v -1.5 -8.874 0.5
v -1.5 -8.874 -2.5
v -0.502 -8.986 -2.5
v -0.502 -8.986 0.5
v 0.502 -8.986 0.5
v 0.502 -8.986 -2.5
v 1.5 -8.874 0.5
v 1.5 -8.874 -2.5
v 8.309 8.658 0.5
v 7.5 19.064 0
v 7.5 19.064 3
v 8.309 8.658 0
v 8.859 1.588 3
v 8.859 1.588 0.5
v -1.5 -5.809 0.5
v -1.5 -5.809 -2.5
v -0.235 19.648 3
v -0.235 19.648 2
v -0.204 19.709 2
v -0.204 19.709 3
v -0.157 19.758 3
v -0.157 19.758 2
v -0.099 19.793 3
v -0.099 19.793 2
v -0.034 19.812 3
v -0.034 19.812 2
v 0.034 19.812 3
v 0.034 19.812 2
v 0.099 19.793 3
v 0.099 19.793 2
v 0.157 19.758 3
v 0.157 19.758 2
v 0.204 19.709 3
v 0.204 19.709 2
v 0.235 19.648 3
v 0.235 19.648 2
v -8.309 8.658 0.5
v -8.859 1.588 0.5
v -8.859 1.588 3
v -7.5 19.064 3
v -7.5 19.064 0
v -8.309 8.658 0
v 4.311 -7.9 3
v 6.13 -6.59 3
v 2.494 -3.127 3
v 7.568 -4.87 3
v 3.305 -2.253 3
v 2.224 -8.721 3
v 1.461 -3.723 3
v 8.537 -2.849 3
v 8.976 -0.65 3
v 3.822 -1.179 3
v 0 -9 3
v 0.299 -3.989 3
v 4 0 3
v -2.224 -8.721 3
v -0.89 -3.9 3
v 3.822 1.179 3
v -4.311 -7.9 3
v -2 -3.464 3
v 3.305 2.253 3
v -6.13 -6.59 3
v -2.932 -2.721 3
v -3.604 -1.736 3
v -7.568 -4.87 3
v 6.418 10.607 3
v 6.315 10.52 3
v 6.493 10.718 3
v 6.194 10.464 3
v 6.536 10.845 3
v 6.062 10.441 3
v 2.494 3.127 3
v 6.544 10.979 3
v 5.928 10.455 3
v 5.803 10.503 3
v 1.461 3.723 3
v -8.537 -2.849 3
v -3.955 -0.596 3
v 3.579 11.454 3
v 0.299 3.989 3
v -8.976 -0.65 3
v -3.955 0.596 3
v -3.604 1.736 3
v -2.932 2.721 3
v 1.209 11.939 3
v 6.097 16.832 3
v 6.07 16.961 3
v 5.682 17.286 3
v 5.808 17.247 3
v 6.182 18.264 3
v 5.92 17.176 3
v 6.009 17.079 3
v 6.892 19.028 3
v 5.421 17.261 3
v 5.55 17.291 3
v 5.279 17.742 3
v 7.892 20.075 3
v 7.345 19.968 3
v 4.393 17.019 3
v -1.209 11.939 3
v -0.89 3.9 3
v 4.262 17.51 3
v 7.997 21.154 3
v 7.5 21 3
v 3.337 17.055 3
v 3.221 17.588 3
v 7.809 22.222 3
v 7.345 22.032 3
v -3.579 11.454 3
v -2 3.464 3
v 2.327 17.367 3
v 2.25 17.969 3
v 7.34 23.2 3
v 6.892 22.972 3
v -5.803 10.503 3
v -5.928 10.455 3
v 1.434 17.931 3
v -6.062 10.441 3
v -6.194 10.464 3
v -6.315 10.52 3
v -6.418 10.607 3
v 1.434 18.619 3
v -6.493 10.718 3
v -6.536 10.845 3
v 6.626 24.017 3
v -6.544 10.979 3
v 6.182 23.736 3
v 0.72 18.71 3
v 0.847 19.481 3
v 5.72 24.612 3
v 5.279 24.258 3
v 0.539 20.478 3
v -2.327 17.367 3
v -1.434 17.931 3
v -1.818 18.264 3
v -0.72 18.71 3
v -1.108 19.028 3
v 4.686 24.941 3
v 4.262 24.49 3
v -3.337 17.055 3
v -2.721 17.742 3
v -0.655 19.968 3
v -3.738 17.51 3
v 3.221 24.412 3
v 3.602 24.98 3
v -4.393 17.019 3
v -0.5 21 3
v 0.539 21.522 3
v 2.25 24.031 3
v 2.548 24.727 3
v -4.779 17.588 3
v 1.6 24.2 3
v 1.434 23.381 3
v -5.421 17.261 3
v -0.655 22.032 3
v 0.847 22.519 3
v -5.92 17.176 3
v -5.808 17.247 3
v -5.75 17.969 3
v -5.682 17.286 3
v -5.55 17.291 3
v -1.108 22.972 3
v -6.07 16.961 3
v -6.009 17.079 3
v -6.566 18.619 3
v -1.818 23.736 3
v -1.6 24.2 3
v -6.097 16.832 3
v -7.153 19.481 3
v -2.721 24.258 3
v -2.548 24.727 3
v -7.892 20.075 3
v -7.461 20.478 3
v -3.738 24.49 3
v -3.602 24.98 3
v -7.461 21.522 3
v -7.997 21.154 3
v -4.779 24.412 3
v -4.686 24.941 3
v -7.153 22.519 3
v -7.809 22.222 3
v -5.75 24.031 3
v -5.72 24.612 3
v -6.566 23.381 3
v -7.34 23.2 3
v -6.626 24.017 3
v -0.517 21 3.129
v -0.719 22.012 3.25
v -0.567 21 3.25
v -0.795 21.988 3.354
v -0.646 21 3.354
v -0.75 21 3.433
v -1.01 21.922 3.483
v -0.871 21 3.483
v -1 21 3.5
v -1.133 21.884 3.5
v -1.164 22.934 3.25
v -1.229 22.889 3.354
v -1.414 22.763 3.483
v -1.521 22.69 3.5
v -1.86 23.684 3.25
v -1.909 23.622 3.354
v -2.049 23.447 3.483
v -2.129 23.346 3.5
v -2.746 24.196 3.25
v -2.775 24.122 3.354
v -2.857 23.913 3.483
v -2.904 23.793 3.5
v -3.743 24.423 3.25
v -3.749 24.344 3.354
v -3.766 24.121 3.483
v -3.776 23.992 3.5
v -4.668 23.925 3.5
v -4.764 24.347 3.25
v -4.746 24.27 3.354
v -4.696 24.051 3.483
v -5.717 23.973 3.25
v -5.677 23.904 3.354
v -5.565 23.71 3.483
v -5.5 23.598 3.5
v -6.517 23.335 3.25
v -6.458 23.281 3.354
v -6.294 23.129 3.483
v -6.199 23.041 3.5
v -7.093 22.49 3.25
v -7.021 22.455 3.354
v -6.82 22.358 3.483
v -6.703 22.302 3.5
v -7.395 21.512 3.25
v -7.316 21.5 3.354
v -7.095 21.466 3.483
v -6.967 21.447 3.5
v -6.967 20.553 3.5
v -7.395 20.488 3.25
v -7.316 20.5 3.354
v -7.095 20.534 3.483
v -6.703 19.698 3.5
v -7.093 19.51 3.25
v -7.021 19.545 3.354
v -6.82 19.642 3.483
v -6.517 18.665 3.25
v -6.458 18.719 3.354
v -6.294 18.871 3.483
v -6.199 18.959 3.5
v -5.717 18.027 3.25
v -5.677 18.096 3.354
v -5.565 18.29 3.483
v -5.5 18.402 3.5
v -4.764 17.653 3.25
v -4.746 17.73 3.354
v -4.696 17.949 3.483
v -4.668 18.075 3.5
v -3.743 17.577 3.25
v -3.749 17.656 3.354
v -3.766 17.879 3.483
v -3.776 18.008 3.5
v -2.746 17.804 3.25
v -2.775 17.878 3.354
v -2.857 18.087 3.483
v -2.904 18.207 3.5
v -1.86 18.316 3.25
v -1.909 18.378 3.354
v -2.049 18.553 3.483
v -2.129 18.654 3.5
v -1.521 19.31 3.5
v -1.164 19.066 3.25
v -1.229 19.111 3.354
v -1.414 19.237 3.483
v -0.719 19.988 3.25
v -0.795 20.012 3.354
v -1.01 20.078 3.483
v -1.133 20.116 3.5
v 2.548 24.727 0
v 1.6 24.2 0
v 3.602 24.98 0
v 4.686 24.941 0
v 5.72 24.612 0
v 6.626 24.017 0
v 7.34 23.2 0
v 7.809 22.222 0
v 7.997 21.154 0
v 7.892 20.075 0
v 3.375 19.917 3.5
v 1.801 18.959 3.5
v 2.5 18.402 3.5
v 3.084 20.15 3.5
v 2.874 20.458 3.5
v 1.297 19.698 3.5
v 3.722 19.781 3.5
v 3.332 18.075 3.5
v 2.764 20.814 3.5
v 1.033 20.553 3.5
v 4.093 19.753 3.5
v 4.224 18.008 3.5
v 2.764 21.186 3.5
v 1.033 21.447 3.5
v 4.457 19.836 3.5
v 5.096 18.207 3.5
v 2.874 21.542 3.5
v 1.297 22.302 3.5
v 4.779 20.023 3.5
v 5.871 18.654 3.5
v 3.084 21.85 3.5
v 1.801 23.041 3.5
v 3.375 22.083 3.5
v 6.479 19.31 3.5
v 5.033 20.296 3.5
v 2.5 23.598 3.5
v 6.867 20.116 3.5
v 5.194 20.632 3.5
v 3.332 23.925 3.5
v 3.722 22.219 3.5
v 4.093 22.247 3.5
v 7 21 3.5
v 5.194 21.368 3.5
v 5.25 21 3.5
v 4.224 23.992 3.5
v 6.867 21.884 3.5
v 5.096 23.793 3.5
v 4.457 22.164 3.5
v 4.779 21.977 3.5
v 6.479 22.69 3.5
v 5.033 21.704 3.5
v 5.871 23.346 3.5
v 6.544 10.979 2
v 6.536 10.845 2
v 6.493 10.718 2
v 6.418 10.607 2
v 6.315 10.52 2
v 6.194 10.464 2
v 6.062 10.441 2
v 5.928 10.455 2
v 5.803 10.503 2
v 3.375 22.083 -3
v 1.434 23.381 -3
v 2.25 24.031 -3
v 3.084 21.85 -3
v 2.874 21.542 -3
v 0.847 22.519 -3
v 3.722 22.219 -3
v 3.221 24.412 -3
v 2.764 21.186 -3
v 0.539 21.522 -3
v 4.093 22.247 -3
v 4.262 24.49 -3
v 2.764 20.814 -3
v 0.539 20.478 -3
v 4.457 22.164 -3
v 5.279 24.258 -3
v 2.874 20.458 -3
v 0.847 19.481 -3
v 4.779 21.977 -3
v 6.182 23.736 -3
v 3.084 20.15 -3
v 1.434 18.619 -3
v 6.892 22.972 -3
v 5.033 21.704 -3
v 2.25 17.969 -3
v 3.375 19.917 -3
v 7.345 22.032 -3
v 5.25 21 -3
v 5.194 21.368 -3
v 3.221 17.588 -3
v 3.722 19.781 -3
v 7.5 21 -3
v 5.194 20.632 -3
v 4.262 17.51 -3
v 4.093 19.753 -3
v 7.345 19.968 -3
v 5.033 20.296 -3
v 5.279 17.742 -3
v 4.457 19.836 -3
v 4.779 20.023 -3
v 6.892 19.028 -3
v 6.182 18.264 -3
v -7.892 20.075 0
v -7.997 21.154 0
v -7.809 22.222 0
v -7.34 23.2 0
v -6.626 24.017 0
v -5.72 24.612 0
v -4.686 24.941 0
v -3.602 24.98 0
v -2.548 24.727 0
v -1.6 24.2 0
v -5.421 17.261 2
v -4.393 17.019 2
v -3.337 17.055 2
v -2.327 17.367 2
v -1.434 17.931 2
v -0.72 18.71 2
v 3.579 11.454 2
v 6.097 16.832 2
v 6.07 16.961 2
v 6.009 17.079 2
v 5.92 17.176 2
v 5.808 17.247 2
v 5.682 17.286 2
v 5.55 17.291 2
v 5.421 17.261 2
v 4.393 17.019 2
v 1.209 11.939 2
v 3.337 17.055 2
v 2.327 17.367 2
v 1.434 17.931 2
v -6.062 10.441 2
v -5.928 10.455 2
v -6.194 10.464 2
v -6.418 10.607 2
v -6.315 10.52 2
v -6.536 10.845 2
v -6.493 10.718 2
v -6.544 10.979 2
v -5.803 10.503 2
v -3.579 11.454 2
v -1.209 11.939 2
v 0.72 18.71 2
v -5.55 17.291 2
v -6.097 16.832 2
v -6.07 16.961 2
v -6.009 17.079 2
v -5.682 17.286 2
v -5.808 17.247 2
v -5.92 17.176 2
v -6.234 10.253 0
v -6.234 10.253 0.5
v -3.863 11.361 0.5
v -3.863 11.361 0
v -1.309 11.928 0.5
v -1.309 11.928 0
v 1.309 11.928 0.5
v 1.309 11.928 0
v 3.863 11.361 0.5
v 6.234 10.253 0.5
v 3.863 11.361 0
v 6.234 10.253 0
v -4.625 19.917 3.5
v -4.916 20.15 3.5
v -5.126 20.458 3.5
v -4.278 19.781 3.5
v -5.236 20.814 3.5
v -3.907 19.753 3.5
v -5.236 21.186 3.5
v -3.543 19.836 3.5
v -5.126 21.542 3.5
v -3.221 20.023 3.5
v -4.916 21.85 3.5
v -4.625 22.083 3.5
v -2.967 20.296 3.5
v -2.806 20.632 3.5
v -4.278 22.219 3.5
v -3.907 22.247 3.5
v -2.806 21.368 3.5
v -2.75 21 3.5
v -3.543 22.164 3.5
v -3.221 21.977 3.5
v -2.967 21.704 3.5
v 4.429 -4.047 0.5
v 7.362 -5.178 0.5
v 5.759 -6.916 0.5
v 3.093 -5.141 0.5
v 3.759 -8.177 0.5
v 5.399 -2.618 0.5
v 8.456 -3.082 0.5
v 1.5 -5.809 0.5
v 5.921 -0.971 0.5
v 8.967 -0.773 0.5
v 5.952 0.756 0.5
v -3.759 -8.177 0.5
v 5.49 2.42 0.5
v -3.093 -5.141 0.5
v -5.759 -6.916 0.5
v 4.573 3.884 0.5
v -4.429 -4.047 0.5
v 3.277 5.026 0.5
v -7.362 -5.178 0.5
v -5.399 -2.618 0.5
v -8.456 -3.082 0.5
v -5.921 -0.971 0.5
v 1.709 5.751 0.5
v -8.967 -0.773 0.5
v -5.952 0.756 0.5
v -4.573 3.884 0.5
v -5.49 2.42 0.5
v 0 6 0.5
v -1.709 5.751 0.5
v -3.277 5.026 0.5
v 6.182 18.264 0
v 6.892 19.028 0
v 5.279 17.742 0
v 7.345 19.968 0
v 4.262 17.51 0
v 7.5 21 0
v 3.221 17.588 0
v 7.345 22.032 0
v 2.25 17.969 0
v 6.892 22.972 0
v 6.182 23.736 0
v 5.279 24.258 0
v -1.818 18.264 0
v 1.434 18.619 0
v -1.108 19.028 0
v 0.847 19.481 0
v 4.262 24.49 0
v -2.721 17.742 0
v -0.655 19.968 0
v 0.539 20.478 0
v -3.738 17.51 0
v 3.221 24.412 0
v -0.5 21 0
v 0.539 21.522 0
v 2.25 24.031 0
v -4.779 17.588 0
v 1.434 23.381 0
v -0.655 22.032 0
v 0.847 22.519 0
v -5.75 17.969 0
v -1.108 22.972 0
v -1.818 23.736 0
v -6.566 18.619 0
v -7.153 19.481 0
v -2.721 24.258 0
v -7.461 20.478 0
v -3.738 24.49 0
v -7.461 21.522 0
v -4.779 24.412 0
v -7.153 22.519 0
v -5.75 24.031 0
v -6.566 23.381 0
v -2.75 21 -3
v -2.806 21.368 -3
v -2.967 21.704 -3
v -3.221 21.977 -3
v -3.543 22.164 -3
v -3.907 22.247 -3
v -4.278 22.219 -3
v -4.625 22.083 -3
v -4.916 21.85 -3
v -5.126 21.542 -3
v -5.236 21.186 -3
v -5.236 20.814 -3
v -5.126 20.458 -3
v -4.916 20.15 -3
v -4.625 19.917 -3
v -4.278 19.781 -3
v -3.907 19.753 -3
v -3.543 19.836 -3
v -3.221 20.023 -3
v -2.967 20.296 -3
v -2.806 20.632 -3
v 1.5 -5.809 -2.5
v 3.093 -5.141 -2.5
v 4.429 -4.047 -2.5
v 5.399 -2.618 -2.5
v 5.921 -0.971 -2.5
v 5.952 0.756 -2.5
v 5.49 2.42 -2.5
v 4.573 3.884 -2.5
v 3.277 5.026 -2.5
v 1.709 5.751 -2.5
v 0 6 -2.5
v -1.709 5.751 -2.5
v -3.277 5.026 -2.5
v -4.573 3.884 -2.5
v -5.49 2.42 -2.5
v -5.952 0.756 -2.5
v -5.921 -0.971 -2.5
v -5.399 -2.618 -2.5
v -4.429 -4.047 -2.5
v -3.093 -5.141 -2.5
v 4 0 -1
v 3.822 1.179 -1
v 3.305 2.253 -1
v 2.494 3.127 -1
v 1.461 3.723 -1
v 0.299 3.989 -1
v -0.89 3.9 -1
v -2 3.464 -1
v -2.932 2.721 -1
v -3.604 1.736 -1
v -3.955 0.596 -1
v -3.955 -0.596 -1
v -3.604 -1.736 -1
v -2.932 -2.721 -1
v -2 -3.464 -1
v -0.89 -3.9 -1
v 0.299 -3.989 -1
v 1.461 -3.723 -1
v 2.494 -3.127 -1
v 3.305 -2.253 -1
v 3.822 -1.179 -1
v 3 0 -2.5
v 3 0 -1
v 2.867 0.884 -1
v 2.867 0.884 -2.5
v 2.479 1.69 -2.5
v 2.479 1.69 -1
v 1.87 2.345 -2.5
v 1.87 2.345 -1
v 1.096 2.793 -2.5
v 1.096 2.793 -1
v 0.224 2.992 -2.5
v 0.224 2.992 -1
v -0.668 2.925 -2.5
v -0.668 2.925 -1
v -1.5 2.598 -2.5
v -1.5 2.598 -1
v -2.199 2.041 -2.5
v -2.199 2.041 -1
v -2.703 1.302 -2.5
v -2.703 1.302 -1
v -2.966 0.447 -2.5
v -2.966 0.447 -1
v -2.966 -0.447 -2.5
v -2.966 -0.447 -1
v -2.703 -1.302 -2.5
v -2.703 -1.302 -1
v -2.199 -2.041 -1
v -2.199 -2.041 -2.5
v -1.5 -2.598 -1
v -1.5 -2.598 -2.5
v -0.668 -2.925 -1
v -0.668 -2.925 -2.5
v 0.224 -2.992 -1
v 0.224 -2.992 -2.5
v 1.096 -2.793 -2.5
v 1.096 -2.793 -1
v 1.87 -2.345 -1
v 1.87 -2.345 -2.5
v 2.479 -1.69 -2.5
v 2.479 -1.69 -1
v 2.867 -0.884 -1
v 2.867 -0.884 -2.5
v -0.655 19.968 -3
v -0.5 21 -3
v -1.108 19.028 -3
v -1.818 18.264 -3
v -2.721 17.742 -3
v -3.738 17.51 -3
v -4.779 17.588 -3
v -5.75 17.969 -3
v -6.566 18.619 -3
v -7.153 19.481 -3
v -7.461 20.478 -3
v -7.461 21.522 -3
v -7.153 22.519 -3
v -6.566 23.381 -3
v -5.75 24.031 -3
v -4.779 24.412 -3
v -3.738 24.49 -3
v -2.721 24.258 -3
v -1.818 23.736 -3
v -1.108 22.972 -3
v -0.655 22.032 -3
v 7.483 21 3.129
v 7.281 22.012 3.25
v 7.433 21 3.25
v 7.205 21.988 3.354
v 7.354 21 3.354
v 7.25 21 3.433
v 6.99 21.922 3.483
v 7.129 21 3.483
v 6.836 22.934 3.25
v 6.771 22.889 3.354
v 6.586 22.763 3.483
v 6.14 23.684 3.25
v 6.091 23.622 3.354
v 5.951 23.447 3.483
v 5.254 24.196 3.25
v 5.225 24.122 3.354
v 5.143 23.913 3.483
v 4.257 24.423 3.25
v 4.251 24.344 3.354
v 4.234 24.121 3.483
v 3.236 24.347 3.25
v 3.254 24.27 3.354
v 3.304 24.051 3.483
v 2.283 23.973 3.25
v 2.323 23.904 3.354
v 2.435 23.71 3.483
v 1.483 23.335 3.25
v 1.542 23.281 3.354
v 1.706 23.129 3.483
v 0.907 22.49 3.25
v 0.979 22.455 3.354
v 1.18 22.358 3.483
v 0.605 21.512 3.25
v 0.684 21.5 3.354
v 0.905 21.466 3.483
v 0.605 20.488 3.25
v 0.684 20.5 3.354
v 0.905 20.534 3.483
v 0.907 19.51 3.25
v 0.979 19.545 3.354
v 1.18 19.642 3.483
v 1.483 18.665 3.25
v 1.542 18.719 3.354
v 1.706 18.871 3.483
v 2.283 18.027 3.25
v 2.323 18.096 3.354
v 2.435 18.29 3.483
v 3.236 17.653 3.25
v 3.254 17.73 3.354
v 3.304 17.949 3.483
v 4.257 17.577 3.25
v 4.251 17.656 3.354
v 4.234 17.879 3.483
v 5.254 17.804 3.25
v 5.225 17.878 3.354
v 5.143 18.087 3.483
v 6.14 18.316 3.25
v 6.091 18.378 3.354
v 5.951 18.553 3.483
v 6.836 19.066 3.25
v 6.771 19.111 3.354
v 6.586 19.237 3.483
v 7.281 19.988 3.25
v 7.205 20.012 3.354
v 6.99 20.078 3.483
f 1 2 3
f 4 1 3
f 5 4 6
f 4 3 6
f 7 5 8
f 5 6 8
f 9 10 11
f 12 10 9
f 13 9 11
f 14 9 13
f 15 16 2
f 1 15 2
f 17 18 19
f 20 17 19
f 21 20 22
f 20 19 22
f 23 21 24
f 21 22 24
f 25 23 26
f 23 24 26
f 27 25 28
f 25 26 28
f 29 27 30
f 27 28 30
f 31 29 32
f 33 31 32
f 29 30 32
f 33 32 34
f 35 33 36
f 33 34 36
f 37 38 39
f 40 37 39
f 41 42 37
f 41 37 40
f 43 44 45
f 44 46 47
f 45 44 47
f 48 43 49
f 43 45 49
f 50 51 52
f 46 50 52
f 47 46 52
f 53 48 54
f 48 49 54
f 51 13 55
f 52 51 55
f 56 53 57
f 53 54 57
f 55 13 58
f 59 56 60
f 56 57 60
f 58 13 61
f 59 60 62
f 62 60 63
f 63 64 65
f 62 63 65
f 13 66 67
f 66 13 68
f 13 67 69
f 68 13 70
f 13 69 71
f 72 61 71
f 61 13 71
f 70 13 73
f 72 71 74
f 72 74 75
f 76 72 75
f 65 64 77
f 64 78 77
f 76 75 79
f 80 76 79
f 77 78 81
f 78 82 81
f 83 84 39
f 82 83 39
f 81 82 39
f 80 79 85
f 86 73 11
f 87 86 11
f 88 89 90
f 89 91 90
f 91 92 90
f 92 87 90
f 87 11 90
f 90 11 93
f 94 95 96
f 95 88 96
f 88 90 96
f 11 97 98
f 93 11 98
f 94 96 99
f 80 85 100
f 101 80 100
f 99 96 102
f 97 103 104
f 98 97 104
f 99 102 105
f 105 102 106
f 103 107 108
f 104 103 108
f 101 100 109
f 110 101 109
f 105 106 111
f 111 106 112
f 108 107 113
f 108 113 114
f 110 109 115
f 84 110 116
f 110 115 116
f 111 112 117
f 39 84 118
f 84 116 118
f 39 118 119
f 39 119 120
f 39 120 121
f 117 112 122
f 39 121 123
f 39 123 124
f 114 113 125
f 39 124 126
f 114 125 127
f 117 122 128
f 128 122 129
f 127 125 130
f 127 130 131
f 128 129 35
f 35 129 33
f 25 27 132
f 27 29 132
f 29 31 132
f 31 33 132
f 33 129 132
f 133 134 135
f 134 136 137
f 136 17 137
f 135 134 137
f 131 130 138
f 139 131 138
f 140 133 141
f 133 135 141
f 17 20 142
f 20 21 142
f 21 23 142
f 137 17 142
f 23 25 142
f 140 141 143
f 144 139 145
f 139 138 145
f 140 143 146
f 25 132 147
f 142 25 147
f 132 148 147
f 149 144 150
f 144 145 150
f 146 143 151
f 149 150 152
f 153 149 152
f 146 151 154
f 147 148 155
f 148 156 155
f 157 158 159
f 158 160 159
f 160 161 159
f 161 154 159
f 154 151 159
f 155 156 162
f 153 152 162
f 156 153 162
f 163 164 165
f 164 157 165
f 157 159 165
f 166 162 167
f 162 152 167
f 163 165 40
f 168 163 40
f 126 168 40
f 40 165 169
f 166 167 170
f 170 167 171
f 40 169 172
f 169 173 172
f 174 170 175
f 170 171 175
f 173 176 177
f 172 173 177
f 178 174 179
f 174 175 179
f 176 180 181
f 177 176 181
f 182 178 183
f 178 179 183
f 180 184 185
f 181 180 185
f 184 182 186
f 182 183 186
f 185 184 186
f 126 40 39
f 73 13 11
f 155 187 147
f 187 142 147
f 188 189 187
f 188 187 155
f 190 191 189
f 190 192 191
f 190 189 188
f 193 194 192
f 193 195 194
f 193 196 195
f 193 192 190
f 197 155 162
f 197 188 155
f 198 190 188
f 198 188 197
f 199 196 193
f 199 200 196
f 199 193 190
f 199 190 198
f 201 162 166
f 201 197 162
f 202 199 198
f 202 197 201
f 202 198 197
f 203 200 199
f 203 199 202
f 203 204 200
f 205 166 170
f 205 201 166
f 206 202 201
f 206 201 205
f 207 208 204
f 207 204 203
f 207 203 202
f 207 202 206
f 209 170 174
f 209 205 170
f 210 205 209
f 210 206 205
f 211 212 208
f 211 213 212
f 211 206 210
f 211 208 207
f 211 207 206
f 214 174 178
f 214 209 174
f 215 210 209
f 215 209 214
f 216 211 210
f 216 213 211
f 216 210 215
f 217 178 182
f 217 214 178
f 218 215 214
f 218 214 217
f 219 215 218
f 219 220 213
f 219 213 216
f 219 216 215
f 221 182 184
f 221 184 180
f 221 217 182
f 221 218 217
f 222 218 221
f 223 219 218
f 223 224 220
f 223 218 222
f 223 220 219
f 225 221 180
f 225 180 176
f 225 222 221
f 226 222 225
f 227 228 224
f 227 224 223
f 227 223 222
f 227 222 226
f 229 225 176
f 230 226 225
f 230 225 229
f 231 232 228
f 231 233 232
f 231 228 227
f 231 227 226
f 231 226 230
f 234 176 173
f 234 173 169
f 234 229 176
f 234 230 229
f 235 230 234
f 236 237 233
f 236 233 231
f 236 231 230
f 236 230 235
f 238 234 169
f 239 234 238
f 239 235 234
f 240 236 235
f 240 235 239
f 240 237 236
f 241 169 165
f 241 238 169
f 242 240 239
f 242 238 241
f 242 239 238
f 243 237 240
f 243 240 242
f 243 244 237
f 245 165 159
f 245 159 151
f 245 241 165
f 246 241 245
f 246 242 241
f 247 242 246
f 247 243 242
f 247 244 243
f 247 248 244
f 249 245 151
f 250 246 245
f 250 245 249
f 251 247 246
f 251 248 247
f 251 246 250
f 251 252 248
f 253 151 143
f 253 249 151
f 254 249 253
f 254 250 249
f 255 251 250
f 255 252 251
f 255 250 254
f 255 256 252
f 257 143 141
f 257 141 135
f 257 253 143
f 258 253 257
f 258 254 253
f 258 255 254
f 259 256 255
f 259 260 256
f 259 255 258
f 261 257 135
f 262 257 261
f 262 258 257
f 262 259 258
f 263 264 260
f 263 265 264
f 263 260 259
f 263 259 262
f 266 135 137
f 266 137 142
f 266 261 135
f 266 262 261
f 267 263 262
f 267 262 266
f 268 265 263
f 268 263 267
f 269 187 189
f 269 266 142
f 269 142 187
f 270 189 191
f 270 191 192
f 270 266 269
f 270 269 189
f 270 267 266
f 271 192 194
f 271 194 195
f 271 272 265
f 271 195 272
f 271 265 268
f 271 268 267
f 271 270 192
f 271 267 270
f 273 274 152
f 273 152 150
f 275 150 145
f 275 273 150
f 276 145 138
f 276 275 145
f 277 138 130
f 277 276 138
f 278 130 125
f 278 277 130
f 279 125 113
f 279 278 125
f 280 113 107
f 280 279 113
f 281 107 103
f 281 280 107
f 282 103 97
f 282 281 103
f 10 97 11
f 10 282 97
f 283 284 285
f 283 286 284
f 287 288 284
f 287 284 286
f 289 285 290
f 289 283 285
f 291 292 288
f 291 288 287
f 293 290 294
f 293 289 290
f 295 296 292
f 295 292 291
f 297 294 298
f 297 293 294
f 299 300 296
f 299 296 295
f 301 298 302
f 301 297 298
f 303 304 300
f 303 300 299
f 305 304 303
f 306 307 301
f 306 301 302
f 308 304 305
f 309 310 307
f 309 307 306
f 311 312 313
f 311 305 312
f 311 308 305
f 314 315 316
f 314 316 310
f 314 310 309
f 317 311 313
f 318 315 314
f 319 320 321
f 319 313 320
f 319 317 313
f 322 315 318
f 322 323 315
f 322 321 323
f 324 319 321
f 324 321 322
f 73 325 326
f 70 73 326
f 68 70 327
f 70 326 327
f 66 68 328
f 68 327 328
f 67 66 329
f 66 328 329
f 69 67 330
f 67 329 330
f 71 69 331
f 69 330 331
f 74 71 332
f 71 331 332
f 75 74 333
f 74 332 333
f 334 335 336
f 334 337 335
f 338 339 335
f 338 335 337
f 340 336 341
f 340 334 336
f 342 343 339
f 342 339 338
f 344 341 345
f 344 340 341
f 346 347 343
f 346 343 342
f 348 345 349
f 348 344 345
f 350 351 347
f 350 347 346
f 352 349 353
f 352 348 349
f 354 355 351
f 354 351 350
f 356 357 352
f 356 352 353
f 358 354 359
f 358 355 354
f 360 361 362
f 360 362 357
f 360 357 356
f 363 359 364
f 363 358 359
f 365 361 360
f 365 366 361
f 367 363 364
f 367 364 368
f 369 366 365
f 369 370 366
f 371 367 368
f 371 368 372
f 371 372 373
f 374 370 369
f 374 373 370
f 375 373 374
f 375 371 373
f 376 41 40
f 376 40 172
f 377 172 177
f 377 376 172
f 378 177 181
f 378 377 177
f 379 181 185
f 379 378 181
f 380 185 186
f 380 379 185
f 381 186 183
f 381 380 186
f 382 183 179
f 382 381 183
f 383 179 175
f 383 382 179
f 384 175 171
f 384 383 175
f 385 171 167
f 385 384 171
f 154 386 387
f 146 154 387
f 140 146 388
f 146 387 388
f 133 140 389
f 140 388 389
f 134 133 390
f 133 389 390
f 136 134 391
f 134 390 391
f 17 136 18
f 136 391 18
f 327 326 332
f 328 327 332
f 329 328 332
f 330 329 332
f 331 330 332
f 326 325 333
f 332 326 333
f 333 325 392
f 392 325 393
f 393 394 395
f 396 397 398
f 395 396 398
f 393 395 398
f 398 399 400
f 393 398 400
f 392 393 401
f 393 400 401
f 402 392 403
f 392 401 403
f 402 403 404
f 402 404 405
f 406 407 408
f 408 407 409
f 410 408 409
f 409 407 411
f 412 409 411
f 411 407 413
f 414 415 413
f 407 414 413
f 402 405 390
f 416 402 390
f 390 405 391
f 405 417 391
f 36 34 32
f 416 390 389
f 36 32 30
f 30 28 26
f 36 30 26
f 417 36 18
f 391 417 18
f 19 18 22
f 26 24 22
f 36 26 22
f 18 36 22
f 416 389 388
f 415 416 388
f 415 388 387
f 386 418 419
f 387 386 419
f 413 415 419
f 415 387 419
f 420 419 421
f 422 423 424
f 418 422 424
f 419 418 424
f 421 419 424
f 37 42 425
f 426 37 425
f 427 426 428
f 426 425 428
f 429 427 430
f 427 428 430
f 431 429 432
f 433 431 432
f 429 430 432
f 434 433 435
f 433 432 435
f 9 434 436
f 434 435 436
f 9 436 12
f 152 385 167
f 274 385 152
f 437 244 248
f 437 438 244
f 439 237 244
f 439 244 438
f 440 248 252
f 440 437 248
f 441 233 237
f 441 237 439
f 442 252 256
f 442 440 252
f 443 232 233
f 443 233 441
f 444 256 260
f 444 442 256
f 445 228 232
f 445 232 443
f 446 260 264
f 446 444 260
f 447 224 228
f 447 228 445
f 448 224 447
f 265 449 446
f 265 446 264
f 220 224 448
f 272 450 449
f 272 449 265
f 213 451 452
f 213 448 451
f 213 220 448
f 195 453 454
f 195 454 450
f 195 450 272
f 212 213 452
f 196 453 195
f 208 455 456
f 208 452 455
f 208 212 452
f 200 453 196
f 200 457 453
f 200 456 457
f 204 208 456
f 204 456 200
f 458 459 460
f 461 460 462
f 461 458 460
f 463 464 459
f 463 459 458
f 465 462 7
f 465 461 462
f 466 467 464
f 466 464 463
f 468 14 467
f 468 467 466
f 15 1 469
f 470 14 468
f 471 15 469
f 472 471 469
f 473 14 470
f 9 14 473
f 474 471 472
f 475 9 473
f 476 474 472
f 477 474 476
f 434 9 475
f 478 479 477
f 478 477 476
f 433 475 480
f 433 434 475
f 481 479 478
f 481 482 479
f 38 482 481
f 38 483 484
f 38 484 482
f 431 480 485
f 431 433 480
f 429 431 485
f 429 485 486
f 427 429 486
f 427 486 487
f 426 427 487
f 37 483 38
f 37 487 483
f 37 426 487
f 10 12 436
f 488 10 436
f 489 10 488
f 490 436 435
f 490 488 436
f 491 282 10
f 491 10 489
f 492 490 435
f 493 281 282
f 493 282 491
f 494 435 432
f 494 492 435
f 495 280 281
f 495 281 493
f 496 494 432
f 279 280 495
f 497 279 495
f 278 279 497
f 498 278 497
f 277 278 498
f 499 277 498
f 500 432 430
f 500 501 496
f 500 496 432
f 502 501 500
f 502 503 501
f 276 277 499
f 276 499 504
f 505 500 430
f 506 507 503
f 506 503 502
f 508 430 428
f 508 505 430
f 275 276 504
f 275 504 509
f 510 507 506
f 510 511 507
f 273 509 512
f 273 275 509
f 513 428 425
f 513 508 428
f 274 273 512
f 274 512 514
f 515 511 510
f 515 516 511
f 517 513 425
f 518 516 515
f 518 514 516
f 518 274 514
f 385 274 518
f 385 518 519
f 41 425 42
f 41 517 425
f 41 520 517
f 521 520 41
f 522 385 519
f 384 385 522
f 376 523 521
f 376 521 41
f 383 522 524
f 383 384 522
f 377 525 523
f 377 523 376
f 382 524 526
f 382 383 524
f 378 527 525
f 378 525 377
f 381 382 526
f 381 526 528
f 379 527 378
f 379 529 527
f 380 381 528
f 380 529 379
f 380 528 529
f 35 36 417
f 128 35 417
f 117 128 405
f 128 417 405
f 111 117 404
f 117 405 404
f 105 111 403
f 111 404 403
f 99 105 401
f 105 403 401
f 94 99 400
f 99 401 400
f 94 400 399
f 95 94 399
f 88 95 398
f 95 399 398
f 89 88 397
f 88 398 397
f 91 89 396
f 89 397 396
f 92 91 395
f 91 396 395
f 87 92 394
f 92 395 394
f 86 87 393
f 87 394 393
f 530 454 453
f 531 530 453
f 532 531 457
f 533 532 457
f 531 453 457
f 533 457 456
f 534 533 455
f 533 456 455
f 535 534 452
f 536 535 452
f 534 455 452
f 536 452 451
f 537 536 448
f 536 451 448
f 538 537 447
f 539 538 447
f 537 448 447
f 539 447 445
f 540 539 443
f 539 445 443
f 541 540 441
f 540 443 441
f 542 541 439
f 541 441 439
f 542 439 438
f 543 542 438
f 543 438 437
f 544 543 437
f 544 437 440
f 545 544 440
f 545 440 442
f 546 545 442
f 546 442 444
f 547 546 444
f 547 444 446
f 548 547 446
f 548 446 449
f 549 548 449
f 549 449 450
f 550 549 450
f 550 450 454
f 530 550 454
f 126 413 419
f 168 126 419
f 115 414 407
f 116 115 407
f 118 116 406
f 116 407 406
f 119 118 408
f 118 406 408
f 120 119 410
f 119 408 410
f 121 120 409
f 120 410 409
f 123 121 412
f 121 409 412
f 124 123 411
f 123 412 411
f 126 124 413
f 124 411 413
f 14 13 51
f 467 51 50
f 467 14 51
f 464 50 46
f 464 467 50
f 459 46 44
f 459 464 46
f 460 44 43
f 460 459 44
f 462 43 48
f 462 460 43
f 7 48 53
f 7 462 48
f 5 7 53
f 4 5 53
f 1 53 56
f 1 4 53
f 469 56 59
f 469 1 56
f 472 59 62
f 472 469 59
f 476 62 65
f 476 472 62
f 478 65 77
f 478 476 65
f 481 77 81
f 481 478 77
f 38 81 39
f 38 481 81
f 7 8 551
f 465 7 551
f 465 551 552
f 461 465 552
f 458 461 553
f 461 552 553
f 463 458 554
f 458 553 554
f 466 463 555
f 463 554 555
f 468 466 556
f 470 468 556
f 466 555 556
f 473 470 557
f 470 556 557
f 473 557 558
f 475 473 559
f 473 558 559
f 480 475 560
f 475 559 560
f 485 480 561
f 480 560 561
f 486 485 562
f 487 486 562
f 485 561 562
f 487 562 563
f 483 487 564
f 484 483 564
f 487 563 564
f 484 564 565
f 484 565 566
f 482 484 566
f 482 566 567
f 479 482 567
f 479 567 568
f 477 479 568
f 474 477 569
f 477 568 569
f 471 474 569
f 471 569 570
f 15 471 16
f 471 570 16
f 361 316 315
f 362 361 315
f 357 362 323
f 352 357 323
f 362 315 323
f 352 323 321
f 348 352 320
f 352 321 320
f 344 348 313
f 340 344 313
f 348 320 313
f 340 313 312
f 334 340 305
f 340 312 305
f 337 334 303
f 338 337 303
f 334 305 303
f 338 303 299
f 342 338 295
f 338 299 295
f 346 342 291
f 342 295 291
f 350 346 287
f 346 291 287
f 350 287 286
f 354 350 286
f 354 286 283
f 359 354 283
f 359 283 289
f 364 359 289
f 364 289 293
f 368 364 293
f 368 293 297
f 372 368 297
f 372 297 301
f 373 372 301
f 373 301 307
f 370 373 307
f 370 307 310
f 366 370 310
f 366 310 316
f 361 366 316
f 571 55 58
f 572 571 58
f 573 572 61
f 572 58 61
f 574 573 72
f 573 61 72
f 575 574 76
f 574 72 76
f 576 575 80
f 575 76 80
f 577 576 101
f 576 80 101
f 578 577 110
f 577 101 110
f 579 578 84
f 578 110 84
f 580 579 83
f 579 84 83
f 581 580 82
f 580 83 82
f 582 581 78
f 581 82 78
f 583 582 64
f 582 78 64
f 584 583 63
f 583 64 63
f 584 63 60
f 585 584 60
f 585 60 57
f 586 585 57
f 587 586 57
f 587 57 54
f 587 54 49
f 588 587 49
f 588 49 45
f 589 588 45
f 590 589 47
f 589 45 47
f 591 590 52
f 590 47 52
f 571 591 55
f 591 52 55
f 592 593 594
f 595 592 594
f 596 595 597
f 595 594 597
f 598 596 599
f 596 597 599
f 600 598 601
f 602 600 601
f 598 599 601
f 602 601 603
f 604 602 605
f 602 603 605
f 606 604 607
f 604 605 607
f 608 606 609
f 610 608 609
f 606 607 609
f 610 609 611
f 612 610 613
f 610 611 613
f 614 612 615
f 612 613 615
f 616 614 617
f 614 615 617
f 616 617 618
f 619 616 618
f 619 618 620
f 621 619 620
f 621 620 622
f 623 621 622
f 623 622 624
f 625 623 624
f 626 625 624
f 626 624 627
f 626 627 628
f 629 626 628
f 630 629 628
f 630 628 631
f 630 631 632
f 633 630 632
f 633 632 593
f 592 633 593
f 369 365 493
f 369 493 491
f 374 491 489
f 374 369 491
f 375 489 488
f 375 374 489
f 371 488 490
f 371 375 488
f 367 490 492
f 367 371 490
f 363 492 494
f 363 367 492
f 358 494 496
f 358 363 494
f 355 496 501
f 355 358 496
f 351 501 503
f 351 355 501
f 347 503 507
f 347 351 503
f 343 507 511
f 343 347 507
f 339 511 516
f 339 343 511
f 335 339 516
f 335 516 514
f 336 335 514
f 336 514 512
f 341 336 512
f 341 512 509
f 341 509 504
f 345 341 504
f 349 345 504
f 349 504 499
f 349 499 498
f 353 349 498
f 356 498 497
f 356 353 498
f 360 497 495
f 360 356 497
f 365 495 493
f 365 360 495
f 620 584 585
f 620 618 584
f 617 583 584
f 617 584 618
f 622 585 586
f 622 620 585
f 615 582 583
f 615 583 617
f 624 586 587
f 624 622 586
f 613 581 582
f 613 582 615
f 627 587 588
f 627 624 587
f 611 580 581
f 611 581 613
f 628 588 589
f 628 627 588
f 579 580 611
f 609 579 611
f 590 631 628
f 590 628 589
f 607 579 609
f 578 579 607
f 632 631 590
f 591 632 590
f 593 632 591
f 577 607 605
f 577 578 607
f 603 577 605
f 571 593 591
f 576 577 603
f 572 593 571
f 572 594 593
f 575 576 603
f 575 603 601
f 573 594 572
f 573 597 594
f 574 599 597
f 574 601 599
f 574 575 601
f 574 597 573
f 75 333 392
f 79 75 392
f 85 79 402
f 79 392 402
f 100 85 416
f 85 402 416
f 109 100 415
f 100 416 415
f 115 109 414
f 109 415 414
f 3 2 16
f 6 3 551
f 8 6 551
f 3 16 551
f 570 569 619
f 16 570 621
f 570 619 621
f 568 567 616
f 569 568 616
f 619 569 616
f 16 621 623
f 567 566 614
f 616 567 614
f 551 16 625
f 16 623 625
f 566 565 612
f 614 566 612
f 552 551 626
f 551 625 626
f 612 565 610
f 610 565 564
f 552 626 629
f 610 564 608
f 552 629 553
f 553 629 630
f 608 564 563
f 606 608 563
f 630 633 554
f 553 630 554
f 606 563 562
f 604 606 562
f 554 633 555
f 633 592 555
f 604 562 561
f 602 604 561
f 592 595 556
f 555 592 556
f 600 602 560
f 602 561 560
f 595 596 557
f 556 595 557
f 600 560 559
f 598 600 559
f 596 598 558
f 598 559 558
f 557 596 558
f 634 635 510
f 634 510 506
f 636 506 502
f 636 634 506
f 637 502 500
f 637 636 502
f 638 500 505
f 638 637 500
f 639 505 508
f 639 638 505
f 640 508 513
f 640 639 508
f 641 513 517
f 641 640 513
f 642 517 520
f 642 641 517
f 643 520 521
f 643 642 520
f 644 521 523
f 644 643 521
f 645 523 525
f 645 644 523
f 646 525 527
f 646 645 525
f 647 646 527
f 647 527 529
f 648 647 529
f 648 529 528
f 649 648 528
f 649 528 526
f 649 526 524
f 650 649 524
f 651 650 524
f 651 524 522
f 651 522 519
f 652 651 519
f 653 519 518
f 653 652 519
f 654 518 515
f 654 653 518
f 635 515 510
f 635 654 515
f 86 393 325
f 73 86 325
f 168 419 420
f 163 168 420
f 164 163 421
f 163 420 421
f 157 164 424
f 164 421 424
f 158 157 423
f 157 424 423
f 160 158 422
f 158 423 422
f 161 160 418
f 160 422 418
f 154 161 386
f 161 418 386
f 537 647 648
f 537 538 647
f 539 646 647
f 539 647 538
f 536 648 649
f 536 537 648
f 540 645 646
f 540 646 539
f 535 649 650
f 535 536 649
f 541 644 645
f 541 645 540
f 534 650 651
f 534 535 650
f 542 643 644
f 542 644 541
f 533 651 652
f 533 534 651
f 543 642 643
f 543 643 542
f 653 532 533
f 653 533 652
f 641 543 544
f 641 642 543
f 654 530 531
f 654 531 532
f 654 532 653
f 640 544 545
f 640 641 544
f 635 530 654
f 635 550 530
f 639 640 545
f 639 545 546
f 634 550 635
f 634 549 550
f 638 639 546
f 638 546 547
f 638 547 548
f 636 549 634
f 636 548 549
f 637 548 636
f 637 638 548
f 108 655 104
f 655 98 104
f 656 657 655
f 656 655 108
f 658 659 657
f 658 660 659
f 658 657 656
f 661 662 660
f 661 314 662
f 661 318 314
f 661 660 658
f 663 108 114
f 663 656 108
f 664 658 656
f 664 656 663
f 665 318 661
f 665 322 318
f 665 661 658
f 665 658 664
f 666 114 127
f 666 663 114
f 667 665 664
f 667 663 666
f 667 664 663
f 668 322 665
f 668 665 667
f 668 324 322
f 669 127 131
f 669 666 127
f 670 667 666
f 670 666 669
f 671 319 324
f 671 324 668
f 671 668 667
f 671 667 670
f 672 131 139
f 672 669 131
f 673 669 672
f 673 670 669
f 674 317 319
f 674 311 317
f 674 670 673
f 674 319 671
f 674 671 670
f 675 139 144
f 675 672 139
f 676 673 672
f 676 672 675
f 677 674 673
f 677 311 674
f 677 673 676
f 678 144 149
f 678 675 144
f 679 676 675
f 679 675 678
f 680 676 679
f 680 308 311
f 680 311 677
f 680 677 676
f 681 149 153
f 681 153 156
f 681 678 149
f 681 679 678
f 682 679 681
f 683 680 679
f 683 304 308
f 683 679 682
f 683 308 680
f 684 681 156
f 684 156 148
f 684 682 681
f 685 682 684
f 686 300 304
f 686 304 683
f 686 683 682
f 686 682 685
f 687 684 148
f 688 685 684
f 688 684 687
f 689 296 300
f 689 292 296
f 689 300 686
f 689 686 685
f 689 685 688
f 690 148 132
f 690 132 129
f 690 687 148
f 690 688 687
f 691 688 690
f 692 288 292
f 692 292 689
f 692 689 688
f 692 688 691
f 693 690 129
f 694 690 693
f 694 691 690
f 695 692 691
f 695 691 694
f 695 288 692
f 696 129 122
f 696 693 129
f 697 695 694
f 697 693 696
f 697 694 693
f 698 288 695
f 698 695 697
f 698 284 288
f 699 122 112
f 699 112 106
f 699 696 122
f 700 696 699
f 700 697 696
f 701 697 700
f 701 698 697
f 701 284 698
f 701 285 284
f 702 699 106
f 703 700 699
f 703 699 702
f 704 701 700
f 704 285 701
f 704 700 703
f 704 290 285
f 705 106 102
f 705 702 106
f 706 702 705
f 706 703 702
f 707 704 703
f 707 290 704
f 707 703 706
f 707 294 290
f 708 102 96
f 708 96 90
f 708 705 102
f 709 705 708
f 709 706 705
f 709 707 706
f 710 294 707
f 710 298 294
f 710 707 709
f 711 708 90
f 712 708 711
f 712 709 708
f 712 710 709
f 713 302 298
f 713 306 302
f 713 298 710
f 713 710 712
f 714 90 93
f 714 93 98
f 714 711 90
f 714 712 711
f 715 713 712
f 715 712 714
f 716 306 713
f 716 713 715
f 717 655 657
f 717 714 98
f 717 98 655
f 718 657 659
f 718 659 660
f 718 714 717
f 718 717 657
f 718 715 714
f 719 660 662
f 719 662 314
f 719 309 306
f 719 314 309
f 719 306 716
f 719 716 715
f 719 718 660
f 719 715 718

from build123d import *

# Parameters (mm, degrees)
BASE_EXTRUSION_DEPTH    = 3
ESQUISSE2_R             = 3.5
BOSS_EXTRU_1_DEPTH      = 0.5
CONG_1_R                = 0.5
ENL_V_START             = -1
ENL_V_MAT_EXTRU_1_DEPTH = 1
BOSS_EXTRU_2_START      = 3
ESQUISSE5_R             = 3.5
BOSS_EXTRU_2_DEPTH      = 3
ESQUISSE4_R             = 1.25
ENL_V_MAT_EXTRU_3_DEPTH = 28.354158733
ESQUISSE9_R             = 12
ENL_V_MAT_EXTRU_4_DEPTH = 0.5
BOSS_EXTRU_3_START      = 3
BOSS_EXTRU_3_DEPTH      = 3
ESQUISSE12_R            = 4
ENL_V_MAT_EXTRU_5_DEPTH = 4
ESQUISSE13_R            = 3
ENL_V_MAT_EXTRU_6_DEPTH = 27.949025956


with BuildPart() as part:
    # Esquisse1 → Base-Extrusion (new body)
    with BuildSketch(Plane.XY):
        with BuildLine():
            Line((-8.858707286, 1.588491495), (-7.5, 19.063508327))
            ThreePointArc((-7.5, 19.063508327), (-6.626477999, 24.01688802), (-1.6, 24.2))
            Line((-1.6, 24.2), (1.6, 24.2))
            ThreePointArc((1.6, 24.2), (6.626477999, 24.01688802), (7.5, 19.063508327))
            Line((7.5, 19.063508327), (8.858707286, 1.588491495))
            ThreePointArc((8.858707286, 1.588491495), (0, -9), (-8.858707286, 1.588491495))
        make_face()
    extrude(amount=BASE_EXTRUSION_DEPTH)

    # Esquisse2 → Boss.-Extru.1 (add)
    with BuildSketch(Plane.XY.offset(3)):
        with Locations((4, 21)):
            Circle(ESQUISSE2_R)
        with Locations((-4, 21)):
            Circle(ESQUISSE2_R)
    extrude(amount=BOSS_EXTRU_1_DEPTH)

    # Congé1
    cong_1_edges = [part.edges().sort_by_distance(p)[0] for p in [
        (0.5, 21, 3.5),
        (-7.5, 21, 3.5),
    ]]
    fillet(cong_1_edges, radius=CONG_1_R - 0.0001)  # a hair under: the kernel refuses the full size

    # Esquisse3 → Enlèv. mat.-Extru.1 (cut)
    with BuildSketch(Plane.XY.offset(3).offset(ENL_V_START)):
        with BuildLine():
            Line((-6.543725832, 10.97906245), (-6.097110858, 16.831549851))
            ThreePointArc((-6.097110858, 16.831549851), (-5.866577748, 17.215602456), (-5.420942587, 17.260892865))
            ThreePointArc((-5.420942587, 17.260892865), (-2.327193854, 17.366582931), (-0.235294118, 19.648338201))
            ThreePointArc((-0.235294118, 19.648338201), (0, 19.813859338), (0.235294118, 19.648338201))
            ThreePointArc((0.235294118, 19.648338201), (2.327193854, 17.366582931), (5.420942587, 17.260892865))
            ThreePointArc((5.420942587, 17.260892865), (5.866577748, 17.215602456), (6.097110858, 16.831549851))
            Line((6.097110858, 16.831549851), (6.543725832, 10.97906245))
            ThreePointArc((6.543725832, 10.97906245), (6.315450438, 10.520361161), (5.803368369, 10.503376389))
            ThreePointArc((5.803368369, 10.503376389), (0, 12), (-5.803368369, 10.503376389))
            ThreePointArc((-5.803368369, 10.503376389), (-6.315450438, 10.520361161), (-6.543725832, 10.97906245))
        make_face()
    extrude(amount=ENL_V_MAT_EXTRU_1_DEPTH, mode=Mode.SUBTRACT)

    # Esquisse5 → Boss.-Extru.2 (add)
    with BuildSketch(Plane(origin=(0, 0, 0), x_dir=(-1, 0, 0), z_dir=(0, 0, -1)).offset(BOSS_EXTRU_2_START)):
        with Locations(Location((4, 21, 0), (0, 0, 180))):
            Circle(ESQUISSE5_R)
        with Locations(Location((-4, 21, 0), (0, 0, 180))):
            Circle(ESQUISSE5_R)
    extrude(amount=-BOSS_EXTRU_2_DEPTH)

    # Esquisse4 → Enlèv. mat.-Extru.3 (cut, through all)
    with BuildSketch(Plane.XY.offset(3.5)):
        with Locations((4, 21)):
            Circle(ESQUISSE4_R)
        with Locations((-4, 21)):
            Circle(ESQUISSE4_R)
    extrude(amount=-ENL_V_MAT_EXTRU_3_DEPTH, mode=Mode.SUBTRACT)

    # Esquisse9 → Enlèv. mat.-Extru.4 (cut)
    with BuildSketch(Plane(origin=(0, 0, 0), x_dir=(-1, 0, 0), z_dir=(0, 0, -1))):
        Circle(ESQUISSE9_R)
    extrude(amount=-ENL_V_MAT_EXTRU_4_DEPTH, mode=Mode.SUBTRACT)

    # Esquisse11 → Boss.-Extru.3 (add)
    with BuildSketch(Plane(origin=(0, 0, 0.5), x_dir=(-1, 0, 0), z_dir=(0, 0, -1)).offset(BOSS_EXTRU_3_START)):
        with BuildLine():
            Line((1.5, -5.809475019), (1.5, -8.874119675))
            ThreePointArc((1.5, -8.874119675), (0, -9), (-1.5, -8.874119675))
            Line((-1.5, -8.874119675), (-1.5, -5.809475019))
            ThreePointArc((-1.5, -5.809475019), (0, 6), (1.5, -5.809475019))
        make_face()
    extrude(amount=-BOSS_EXTRU_3_DEPTH)

    # Esquisse12 → Enlèv. mat.-Extru.5 (cut)
    with BuildSketch(Plane.XY.offset(3)):
        Circle(ESQUISSE12_R)
    extrude(amount=-ENL_V_MAT_EXTRU_5_DEPTH, mode=Mode.SUBTRACT)

    # Esquisse13 → Enlèv. mat.-Extru.6 (cut, through all)
    with BuildSketch(Plane.XY.offset(-1)):
        Circle(ESQUISSE13_R)
    extrude(amount=-ENL_V_MAT_EXTRU_6_DEPTH, mode=Mode.SUBTRACT)


solid = part.part
